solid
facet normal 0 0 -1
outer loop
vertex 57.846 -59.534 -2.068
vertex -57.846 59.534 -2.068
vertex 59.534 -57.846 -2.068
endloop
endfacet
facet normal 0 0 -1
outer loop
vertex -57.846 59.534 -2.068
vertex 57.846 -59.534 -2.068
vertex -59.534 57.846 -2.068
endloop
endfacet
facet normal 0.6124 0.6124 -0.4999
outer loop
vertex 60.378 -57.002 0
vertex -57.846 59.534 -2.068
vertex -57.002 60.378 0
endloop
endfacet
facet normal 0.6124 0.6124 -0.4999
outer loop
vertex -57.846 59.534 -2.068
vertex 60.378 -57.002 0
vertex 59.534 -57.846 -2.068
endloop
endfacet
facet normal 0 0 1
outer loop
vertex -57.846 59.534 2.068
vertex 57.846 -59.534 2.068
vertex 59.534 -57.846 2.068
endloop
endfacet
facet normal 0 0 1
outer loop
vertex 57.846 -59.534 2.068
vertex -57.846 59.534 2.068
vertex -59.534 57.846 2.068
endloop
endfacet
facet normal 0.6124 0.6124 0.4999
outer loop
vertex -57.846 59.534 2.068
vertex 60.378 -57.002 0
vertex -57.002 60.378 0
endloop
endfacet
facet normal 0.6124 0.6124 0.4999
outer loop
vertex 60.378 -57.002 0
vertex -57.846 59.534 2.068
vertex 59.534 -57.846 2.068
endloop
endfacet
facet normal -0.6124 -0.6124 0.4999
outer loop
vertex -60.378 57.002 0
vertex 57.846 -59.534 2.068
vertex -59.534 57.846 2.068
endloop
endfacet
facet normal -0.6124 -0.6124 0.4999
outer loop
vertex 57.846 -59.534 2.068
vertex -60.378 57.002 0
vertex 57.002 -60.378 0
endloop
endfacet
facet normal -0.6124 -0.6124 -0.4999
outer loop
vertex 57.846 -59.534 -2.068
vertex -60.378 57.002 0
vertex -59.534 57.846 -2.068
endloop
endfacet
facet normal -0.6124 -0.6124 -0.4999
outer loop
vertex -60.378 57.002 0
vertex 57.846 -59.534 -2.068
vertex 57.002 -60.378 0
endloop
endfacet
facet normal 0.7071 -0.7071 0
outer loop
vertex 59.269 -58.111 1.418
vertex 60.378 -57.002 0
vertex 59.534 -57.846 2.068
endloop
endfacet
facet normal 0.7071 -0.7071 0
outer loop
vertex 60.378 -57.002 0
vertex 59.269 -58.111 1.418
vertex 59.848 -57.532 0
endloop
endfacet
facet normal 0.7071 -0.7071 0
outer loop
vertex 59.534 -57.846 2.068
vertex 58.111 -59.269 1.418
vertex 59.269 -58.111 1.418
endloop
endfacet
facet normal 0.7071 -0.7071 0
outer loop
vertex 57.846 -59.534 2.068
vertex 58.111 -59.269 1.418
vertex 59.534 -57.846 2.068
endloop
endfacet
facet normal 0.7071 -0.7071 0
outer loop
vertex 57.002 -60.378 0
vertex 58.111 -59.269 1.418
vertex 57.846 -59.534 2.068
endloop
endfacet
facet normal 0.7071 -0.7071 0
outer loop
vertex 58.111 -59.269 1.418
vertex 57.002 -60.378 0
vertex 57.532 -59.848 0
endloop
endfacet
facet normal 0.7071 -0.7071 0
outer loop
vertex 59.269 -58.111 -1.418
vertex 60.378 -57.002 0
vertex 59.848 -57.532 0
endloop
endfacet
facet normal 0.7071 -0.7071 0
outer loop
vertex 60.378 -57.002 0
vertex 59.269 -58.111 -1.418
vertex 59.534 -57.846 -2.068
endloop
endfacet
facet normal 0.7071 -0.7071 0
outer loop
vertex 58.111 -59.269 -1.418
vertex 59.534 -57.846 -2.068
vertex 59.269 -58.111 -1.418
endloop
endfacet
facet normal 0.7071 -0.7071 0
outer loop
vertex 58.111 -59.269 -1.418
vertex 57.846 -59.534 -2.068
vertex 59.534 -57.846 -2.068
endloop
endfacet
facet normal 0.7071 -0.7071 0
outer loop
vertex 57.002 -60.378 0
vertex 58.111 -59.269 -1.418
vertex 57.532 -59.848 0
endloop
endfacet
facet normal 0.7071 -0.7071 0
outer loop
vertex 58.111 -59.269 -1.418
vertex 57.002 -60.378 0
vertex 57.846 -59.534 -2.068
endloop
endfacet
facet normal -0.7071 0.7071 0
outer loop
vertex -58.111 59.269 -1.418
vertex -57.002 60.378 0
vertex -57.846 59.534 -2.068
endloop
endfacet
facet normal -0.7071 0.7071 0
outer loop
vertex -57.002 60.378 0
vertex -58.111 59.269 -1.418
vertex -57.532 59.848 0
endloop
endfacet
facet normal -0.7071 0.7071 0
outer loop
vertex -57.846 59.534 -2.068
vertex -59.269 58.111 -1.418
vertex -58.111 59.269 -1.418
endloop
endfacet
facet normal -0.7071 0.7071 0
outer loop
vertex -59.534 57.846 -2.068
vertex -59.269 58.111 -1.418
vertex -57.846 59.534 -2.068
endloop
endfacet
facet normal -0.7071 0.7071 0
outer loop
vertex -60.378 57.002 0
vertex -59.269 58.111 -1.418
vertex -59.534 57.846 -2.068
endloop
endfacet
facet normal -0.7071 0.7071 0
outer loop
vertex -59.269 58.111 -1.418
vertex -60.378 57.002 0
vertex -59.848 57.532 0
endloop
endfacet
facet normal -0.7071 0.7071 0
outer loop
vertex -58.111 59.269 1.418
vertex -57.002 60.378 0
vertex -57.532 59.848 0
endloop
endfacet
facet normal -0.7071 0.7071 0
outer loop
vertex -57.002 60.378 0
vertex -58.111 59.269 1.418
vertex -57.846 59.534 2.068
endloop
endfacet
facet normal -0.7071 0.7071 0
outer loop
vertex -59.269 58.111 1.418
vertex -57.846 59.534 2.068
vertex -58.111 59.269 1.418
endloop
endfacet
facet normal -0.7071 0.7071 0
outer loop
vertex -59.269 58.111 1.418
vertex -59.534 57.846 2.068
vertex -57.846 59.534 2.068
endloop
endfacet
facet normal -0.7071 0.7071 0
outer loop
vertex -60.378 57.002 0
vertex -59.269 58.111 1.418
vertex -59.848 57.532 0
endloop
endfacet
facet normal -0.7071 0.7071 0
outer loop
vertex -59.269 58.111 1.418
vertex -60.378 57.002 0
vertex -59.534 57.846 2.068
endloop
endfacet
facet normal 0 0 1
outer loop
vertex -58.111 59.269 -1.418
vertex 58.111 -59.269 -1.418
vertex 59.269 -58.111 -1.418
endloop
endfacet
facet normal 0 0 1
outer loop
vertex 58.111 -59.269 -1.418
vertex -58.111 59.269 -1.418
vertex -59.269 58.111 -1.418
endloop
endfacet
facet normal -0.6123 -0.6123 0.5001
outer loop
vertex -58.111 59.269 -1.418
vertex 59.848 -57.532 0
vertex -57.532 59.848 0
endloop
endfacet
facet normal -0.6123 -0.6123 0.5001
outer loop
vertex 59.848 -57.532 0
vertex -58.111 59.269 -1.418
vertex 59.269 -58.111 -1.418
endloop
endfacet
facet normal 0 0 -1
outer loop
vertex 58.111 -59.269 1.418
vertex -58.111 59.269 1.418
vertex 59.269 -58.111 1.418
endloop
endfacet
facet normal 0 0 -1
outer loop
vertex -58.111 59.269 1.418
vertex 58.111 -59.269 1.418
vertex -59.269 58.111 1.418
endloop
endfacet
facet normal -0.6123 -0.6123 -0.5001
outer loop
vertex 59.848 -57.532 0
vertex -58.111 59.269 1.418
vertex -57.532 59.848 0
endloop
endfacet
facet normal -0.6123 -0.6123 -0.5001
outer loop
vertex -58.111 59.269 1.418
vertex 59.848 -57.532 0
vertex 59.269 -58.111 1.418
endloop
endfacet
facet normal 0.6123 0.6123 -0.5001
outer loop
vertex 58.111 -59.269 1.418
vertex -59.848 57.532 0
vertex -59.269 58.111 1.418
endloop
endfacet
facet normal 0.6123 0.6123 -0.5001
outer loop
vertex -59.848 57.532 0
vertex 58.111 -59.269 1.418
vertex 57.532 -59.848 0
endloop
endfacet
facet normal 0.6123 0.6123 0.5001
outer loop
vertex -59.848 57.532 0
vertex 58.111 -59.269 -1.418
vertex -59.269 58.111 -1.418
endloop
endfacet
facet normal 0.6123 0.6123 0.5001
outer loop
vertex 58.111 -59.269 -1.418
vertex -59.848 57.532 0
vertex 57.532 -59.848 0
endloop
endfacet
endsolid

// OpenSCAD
//Script made by NeoTheFox
//GNU GPL v2 Licence

/*  [Global */

//How much sectors (6 is the best for printing)
sectors = 6;
//Rod end diameter 
ed = 4.7752;
//Rod thickness
wd = 1.5;
//Rod length
l = 166;

$fn=sectors;

rotate([90,0,45])
difference()
{
    cylinder(d=ed, h=l, center=true);
    
    cylinder(d=ed-wd, h=l+2, center=true);
}
